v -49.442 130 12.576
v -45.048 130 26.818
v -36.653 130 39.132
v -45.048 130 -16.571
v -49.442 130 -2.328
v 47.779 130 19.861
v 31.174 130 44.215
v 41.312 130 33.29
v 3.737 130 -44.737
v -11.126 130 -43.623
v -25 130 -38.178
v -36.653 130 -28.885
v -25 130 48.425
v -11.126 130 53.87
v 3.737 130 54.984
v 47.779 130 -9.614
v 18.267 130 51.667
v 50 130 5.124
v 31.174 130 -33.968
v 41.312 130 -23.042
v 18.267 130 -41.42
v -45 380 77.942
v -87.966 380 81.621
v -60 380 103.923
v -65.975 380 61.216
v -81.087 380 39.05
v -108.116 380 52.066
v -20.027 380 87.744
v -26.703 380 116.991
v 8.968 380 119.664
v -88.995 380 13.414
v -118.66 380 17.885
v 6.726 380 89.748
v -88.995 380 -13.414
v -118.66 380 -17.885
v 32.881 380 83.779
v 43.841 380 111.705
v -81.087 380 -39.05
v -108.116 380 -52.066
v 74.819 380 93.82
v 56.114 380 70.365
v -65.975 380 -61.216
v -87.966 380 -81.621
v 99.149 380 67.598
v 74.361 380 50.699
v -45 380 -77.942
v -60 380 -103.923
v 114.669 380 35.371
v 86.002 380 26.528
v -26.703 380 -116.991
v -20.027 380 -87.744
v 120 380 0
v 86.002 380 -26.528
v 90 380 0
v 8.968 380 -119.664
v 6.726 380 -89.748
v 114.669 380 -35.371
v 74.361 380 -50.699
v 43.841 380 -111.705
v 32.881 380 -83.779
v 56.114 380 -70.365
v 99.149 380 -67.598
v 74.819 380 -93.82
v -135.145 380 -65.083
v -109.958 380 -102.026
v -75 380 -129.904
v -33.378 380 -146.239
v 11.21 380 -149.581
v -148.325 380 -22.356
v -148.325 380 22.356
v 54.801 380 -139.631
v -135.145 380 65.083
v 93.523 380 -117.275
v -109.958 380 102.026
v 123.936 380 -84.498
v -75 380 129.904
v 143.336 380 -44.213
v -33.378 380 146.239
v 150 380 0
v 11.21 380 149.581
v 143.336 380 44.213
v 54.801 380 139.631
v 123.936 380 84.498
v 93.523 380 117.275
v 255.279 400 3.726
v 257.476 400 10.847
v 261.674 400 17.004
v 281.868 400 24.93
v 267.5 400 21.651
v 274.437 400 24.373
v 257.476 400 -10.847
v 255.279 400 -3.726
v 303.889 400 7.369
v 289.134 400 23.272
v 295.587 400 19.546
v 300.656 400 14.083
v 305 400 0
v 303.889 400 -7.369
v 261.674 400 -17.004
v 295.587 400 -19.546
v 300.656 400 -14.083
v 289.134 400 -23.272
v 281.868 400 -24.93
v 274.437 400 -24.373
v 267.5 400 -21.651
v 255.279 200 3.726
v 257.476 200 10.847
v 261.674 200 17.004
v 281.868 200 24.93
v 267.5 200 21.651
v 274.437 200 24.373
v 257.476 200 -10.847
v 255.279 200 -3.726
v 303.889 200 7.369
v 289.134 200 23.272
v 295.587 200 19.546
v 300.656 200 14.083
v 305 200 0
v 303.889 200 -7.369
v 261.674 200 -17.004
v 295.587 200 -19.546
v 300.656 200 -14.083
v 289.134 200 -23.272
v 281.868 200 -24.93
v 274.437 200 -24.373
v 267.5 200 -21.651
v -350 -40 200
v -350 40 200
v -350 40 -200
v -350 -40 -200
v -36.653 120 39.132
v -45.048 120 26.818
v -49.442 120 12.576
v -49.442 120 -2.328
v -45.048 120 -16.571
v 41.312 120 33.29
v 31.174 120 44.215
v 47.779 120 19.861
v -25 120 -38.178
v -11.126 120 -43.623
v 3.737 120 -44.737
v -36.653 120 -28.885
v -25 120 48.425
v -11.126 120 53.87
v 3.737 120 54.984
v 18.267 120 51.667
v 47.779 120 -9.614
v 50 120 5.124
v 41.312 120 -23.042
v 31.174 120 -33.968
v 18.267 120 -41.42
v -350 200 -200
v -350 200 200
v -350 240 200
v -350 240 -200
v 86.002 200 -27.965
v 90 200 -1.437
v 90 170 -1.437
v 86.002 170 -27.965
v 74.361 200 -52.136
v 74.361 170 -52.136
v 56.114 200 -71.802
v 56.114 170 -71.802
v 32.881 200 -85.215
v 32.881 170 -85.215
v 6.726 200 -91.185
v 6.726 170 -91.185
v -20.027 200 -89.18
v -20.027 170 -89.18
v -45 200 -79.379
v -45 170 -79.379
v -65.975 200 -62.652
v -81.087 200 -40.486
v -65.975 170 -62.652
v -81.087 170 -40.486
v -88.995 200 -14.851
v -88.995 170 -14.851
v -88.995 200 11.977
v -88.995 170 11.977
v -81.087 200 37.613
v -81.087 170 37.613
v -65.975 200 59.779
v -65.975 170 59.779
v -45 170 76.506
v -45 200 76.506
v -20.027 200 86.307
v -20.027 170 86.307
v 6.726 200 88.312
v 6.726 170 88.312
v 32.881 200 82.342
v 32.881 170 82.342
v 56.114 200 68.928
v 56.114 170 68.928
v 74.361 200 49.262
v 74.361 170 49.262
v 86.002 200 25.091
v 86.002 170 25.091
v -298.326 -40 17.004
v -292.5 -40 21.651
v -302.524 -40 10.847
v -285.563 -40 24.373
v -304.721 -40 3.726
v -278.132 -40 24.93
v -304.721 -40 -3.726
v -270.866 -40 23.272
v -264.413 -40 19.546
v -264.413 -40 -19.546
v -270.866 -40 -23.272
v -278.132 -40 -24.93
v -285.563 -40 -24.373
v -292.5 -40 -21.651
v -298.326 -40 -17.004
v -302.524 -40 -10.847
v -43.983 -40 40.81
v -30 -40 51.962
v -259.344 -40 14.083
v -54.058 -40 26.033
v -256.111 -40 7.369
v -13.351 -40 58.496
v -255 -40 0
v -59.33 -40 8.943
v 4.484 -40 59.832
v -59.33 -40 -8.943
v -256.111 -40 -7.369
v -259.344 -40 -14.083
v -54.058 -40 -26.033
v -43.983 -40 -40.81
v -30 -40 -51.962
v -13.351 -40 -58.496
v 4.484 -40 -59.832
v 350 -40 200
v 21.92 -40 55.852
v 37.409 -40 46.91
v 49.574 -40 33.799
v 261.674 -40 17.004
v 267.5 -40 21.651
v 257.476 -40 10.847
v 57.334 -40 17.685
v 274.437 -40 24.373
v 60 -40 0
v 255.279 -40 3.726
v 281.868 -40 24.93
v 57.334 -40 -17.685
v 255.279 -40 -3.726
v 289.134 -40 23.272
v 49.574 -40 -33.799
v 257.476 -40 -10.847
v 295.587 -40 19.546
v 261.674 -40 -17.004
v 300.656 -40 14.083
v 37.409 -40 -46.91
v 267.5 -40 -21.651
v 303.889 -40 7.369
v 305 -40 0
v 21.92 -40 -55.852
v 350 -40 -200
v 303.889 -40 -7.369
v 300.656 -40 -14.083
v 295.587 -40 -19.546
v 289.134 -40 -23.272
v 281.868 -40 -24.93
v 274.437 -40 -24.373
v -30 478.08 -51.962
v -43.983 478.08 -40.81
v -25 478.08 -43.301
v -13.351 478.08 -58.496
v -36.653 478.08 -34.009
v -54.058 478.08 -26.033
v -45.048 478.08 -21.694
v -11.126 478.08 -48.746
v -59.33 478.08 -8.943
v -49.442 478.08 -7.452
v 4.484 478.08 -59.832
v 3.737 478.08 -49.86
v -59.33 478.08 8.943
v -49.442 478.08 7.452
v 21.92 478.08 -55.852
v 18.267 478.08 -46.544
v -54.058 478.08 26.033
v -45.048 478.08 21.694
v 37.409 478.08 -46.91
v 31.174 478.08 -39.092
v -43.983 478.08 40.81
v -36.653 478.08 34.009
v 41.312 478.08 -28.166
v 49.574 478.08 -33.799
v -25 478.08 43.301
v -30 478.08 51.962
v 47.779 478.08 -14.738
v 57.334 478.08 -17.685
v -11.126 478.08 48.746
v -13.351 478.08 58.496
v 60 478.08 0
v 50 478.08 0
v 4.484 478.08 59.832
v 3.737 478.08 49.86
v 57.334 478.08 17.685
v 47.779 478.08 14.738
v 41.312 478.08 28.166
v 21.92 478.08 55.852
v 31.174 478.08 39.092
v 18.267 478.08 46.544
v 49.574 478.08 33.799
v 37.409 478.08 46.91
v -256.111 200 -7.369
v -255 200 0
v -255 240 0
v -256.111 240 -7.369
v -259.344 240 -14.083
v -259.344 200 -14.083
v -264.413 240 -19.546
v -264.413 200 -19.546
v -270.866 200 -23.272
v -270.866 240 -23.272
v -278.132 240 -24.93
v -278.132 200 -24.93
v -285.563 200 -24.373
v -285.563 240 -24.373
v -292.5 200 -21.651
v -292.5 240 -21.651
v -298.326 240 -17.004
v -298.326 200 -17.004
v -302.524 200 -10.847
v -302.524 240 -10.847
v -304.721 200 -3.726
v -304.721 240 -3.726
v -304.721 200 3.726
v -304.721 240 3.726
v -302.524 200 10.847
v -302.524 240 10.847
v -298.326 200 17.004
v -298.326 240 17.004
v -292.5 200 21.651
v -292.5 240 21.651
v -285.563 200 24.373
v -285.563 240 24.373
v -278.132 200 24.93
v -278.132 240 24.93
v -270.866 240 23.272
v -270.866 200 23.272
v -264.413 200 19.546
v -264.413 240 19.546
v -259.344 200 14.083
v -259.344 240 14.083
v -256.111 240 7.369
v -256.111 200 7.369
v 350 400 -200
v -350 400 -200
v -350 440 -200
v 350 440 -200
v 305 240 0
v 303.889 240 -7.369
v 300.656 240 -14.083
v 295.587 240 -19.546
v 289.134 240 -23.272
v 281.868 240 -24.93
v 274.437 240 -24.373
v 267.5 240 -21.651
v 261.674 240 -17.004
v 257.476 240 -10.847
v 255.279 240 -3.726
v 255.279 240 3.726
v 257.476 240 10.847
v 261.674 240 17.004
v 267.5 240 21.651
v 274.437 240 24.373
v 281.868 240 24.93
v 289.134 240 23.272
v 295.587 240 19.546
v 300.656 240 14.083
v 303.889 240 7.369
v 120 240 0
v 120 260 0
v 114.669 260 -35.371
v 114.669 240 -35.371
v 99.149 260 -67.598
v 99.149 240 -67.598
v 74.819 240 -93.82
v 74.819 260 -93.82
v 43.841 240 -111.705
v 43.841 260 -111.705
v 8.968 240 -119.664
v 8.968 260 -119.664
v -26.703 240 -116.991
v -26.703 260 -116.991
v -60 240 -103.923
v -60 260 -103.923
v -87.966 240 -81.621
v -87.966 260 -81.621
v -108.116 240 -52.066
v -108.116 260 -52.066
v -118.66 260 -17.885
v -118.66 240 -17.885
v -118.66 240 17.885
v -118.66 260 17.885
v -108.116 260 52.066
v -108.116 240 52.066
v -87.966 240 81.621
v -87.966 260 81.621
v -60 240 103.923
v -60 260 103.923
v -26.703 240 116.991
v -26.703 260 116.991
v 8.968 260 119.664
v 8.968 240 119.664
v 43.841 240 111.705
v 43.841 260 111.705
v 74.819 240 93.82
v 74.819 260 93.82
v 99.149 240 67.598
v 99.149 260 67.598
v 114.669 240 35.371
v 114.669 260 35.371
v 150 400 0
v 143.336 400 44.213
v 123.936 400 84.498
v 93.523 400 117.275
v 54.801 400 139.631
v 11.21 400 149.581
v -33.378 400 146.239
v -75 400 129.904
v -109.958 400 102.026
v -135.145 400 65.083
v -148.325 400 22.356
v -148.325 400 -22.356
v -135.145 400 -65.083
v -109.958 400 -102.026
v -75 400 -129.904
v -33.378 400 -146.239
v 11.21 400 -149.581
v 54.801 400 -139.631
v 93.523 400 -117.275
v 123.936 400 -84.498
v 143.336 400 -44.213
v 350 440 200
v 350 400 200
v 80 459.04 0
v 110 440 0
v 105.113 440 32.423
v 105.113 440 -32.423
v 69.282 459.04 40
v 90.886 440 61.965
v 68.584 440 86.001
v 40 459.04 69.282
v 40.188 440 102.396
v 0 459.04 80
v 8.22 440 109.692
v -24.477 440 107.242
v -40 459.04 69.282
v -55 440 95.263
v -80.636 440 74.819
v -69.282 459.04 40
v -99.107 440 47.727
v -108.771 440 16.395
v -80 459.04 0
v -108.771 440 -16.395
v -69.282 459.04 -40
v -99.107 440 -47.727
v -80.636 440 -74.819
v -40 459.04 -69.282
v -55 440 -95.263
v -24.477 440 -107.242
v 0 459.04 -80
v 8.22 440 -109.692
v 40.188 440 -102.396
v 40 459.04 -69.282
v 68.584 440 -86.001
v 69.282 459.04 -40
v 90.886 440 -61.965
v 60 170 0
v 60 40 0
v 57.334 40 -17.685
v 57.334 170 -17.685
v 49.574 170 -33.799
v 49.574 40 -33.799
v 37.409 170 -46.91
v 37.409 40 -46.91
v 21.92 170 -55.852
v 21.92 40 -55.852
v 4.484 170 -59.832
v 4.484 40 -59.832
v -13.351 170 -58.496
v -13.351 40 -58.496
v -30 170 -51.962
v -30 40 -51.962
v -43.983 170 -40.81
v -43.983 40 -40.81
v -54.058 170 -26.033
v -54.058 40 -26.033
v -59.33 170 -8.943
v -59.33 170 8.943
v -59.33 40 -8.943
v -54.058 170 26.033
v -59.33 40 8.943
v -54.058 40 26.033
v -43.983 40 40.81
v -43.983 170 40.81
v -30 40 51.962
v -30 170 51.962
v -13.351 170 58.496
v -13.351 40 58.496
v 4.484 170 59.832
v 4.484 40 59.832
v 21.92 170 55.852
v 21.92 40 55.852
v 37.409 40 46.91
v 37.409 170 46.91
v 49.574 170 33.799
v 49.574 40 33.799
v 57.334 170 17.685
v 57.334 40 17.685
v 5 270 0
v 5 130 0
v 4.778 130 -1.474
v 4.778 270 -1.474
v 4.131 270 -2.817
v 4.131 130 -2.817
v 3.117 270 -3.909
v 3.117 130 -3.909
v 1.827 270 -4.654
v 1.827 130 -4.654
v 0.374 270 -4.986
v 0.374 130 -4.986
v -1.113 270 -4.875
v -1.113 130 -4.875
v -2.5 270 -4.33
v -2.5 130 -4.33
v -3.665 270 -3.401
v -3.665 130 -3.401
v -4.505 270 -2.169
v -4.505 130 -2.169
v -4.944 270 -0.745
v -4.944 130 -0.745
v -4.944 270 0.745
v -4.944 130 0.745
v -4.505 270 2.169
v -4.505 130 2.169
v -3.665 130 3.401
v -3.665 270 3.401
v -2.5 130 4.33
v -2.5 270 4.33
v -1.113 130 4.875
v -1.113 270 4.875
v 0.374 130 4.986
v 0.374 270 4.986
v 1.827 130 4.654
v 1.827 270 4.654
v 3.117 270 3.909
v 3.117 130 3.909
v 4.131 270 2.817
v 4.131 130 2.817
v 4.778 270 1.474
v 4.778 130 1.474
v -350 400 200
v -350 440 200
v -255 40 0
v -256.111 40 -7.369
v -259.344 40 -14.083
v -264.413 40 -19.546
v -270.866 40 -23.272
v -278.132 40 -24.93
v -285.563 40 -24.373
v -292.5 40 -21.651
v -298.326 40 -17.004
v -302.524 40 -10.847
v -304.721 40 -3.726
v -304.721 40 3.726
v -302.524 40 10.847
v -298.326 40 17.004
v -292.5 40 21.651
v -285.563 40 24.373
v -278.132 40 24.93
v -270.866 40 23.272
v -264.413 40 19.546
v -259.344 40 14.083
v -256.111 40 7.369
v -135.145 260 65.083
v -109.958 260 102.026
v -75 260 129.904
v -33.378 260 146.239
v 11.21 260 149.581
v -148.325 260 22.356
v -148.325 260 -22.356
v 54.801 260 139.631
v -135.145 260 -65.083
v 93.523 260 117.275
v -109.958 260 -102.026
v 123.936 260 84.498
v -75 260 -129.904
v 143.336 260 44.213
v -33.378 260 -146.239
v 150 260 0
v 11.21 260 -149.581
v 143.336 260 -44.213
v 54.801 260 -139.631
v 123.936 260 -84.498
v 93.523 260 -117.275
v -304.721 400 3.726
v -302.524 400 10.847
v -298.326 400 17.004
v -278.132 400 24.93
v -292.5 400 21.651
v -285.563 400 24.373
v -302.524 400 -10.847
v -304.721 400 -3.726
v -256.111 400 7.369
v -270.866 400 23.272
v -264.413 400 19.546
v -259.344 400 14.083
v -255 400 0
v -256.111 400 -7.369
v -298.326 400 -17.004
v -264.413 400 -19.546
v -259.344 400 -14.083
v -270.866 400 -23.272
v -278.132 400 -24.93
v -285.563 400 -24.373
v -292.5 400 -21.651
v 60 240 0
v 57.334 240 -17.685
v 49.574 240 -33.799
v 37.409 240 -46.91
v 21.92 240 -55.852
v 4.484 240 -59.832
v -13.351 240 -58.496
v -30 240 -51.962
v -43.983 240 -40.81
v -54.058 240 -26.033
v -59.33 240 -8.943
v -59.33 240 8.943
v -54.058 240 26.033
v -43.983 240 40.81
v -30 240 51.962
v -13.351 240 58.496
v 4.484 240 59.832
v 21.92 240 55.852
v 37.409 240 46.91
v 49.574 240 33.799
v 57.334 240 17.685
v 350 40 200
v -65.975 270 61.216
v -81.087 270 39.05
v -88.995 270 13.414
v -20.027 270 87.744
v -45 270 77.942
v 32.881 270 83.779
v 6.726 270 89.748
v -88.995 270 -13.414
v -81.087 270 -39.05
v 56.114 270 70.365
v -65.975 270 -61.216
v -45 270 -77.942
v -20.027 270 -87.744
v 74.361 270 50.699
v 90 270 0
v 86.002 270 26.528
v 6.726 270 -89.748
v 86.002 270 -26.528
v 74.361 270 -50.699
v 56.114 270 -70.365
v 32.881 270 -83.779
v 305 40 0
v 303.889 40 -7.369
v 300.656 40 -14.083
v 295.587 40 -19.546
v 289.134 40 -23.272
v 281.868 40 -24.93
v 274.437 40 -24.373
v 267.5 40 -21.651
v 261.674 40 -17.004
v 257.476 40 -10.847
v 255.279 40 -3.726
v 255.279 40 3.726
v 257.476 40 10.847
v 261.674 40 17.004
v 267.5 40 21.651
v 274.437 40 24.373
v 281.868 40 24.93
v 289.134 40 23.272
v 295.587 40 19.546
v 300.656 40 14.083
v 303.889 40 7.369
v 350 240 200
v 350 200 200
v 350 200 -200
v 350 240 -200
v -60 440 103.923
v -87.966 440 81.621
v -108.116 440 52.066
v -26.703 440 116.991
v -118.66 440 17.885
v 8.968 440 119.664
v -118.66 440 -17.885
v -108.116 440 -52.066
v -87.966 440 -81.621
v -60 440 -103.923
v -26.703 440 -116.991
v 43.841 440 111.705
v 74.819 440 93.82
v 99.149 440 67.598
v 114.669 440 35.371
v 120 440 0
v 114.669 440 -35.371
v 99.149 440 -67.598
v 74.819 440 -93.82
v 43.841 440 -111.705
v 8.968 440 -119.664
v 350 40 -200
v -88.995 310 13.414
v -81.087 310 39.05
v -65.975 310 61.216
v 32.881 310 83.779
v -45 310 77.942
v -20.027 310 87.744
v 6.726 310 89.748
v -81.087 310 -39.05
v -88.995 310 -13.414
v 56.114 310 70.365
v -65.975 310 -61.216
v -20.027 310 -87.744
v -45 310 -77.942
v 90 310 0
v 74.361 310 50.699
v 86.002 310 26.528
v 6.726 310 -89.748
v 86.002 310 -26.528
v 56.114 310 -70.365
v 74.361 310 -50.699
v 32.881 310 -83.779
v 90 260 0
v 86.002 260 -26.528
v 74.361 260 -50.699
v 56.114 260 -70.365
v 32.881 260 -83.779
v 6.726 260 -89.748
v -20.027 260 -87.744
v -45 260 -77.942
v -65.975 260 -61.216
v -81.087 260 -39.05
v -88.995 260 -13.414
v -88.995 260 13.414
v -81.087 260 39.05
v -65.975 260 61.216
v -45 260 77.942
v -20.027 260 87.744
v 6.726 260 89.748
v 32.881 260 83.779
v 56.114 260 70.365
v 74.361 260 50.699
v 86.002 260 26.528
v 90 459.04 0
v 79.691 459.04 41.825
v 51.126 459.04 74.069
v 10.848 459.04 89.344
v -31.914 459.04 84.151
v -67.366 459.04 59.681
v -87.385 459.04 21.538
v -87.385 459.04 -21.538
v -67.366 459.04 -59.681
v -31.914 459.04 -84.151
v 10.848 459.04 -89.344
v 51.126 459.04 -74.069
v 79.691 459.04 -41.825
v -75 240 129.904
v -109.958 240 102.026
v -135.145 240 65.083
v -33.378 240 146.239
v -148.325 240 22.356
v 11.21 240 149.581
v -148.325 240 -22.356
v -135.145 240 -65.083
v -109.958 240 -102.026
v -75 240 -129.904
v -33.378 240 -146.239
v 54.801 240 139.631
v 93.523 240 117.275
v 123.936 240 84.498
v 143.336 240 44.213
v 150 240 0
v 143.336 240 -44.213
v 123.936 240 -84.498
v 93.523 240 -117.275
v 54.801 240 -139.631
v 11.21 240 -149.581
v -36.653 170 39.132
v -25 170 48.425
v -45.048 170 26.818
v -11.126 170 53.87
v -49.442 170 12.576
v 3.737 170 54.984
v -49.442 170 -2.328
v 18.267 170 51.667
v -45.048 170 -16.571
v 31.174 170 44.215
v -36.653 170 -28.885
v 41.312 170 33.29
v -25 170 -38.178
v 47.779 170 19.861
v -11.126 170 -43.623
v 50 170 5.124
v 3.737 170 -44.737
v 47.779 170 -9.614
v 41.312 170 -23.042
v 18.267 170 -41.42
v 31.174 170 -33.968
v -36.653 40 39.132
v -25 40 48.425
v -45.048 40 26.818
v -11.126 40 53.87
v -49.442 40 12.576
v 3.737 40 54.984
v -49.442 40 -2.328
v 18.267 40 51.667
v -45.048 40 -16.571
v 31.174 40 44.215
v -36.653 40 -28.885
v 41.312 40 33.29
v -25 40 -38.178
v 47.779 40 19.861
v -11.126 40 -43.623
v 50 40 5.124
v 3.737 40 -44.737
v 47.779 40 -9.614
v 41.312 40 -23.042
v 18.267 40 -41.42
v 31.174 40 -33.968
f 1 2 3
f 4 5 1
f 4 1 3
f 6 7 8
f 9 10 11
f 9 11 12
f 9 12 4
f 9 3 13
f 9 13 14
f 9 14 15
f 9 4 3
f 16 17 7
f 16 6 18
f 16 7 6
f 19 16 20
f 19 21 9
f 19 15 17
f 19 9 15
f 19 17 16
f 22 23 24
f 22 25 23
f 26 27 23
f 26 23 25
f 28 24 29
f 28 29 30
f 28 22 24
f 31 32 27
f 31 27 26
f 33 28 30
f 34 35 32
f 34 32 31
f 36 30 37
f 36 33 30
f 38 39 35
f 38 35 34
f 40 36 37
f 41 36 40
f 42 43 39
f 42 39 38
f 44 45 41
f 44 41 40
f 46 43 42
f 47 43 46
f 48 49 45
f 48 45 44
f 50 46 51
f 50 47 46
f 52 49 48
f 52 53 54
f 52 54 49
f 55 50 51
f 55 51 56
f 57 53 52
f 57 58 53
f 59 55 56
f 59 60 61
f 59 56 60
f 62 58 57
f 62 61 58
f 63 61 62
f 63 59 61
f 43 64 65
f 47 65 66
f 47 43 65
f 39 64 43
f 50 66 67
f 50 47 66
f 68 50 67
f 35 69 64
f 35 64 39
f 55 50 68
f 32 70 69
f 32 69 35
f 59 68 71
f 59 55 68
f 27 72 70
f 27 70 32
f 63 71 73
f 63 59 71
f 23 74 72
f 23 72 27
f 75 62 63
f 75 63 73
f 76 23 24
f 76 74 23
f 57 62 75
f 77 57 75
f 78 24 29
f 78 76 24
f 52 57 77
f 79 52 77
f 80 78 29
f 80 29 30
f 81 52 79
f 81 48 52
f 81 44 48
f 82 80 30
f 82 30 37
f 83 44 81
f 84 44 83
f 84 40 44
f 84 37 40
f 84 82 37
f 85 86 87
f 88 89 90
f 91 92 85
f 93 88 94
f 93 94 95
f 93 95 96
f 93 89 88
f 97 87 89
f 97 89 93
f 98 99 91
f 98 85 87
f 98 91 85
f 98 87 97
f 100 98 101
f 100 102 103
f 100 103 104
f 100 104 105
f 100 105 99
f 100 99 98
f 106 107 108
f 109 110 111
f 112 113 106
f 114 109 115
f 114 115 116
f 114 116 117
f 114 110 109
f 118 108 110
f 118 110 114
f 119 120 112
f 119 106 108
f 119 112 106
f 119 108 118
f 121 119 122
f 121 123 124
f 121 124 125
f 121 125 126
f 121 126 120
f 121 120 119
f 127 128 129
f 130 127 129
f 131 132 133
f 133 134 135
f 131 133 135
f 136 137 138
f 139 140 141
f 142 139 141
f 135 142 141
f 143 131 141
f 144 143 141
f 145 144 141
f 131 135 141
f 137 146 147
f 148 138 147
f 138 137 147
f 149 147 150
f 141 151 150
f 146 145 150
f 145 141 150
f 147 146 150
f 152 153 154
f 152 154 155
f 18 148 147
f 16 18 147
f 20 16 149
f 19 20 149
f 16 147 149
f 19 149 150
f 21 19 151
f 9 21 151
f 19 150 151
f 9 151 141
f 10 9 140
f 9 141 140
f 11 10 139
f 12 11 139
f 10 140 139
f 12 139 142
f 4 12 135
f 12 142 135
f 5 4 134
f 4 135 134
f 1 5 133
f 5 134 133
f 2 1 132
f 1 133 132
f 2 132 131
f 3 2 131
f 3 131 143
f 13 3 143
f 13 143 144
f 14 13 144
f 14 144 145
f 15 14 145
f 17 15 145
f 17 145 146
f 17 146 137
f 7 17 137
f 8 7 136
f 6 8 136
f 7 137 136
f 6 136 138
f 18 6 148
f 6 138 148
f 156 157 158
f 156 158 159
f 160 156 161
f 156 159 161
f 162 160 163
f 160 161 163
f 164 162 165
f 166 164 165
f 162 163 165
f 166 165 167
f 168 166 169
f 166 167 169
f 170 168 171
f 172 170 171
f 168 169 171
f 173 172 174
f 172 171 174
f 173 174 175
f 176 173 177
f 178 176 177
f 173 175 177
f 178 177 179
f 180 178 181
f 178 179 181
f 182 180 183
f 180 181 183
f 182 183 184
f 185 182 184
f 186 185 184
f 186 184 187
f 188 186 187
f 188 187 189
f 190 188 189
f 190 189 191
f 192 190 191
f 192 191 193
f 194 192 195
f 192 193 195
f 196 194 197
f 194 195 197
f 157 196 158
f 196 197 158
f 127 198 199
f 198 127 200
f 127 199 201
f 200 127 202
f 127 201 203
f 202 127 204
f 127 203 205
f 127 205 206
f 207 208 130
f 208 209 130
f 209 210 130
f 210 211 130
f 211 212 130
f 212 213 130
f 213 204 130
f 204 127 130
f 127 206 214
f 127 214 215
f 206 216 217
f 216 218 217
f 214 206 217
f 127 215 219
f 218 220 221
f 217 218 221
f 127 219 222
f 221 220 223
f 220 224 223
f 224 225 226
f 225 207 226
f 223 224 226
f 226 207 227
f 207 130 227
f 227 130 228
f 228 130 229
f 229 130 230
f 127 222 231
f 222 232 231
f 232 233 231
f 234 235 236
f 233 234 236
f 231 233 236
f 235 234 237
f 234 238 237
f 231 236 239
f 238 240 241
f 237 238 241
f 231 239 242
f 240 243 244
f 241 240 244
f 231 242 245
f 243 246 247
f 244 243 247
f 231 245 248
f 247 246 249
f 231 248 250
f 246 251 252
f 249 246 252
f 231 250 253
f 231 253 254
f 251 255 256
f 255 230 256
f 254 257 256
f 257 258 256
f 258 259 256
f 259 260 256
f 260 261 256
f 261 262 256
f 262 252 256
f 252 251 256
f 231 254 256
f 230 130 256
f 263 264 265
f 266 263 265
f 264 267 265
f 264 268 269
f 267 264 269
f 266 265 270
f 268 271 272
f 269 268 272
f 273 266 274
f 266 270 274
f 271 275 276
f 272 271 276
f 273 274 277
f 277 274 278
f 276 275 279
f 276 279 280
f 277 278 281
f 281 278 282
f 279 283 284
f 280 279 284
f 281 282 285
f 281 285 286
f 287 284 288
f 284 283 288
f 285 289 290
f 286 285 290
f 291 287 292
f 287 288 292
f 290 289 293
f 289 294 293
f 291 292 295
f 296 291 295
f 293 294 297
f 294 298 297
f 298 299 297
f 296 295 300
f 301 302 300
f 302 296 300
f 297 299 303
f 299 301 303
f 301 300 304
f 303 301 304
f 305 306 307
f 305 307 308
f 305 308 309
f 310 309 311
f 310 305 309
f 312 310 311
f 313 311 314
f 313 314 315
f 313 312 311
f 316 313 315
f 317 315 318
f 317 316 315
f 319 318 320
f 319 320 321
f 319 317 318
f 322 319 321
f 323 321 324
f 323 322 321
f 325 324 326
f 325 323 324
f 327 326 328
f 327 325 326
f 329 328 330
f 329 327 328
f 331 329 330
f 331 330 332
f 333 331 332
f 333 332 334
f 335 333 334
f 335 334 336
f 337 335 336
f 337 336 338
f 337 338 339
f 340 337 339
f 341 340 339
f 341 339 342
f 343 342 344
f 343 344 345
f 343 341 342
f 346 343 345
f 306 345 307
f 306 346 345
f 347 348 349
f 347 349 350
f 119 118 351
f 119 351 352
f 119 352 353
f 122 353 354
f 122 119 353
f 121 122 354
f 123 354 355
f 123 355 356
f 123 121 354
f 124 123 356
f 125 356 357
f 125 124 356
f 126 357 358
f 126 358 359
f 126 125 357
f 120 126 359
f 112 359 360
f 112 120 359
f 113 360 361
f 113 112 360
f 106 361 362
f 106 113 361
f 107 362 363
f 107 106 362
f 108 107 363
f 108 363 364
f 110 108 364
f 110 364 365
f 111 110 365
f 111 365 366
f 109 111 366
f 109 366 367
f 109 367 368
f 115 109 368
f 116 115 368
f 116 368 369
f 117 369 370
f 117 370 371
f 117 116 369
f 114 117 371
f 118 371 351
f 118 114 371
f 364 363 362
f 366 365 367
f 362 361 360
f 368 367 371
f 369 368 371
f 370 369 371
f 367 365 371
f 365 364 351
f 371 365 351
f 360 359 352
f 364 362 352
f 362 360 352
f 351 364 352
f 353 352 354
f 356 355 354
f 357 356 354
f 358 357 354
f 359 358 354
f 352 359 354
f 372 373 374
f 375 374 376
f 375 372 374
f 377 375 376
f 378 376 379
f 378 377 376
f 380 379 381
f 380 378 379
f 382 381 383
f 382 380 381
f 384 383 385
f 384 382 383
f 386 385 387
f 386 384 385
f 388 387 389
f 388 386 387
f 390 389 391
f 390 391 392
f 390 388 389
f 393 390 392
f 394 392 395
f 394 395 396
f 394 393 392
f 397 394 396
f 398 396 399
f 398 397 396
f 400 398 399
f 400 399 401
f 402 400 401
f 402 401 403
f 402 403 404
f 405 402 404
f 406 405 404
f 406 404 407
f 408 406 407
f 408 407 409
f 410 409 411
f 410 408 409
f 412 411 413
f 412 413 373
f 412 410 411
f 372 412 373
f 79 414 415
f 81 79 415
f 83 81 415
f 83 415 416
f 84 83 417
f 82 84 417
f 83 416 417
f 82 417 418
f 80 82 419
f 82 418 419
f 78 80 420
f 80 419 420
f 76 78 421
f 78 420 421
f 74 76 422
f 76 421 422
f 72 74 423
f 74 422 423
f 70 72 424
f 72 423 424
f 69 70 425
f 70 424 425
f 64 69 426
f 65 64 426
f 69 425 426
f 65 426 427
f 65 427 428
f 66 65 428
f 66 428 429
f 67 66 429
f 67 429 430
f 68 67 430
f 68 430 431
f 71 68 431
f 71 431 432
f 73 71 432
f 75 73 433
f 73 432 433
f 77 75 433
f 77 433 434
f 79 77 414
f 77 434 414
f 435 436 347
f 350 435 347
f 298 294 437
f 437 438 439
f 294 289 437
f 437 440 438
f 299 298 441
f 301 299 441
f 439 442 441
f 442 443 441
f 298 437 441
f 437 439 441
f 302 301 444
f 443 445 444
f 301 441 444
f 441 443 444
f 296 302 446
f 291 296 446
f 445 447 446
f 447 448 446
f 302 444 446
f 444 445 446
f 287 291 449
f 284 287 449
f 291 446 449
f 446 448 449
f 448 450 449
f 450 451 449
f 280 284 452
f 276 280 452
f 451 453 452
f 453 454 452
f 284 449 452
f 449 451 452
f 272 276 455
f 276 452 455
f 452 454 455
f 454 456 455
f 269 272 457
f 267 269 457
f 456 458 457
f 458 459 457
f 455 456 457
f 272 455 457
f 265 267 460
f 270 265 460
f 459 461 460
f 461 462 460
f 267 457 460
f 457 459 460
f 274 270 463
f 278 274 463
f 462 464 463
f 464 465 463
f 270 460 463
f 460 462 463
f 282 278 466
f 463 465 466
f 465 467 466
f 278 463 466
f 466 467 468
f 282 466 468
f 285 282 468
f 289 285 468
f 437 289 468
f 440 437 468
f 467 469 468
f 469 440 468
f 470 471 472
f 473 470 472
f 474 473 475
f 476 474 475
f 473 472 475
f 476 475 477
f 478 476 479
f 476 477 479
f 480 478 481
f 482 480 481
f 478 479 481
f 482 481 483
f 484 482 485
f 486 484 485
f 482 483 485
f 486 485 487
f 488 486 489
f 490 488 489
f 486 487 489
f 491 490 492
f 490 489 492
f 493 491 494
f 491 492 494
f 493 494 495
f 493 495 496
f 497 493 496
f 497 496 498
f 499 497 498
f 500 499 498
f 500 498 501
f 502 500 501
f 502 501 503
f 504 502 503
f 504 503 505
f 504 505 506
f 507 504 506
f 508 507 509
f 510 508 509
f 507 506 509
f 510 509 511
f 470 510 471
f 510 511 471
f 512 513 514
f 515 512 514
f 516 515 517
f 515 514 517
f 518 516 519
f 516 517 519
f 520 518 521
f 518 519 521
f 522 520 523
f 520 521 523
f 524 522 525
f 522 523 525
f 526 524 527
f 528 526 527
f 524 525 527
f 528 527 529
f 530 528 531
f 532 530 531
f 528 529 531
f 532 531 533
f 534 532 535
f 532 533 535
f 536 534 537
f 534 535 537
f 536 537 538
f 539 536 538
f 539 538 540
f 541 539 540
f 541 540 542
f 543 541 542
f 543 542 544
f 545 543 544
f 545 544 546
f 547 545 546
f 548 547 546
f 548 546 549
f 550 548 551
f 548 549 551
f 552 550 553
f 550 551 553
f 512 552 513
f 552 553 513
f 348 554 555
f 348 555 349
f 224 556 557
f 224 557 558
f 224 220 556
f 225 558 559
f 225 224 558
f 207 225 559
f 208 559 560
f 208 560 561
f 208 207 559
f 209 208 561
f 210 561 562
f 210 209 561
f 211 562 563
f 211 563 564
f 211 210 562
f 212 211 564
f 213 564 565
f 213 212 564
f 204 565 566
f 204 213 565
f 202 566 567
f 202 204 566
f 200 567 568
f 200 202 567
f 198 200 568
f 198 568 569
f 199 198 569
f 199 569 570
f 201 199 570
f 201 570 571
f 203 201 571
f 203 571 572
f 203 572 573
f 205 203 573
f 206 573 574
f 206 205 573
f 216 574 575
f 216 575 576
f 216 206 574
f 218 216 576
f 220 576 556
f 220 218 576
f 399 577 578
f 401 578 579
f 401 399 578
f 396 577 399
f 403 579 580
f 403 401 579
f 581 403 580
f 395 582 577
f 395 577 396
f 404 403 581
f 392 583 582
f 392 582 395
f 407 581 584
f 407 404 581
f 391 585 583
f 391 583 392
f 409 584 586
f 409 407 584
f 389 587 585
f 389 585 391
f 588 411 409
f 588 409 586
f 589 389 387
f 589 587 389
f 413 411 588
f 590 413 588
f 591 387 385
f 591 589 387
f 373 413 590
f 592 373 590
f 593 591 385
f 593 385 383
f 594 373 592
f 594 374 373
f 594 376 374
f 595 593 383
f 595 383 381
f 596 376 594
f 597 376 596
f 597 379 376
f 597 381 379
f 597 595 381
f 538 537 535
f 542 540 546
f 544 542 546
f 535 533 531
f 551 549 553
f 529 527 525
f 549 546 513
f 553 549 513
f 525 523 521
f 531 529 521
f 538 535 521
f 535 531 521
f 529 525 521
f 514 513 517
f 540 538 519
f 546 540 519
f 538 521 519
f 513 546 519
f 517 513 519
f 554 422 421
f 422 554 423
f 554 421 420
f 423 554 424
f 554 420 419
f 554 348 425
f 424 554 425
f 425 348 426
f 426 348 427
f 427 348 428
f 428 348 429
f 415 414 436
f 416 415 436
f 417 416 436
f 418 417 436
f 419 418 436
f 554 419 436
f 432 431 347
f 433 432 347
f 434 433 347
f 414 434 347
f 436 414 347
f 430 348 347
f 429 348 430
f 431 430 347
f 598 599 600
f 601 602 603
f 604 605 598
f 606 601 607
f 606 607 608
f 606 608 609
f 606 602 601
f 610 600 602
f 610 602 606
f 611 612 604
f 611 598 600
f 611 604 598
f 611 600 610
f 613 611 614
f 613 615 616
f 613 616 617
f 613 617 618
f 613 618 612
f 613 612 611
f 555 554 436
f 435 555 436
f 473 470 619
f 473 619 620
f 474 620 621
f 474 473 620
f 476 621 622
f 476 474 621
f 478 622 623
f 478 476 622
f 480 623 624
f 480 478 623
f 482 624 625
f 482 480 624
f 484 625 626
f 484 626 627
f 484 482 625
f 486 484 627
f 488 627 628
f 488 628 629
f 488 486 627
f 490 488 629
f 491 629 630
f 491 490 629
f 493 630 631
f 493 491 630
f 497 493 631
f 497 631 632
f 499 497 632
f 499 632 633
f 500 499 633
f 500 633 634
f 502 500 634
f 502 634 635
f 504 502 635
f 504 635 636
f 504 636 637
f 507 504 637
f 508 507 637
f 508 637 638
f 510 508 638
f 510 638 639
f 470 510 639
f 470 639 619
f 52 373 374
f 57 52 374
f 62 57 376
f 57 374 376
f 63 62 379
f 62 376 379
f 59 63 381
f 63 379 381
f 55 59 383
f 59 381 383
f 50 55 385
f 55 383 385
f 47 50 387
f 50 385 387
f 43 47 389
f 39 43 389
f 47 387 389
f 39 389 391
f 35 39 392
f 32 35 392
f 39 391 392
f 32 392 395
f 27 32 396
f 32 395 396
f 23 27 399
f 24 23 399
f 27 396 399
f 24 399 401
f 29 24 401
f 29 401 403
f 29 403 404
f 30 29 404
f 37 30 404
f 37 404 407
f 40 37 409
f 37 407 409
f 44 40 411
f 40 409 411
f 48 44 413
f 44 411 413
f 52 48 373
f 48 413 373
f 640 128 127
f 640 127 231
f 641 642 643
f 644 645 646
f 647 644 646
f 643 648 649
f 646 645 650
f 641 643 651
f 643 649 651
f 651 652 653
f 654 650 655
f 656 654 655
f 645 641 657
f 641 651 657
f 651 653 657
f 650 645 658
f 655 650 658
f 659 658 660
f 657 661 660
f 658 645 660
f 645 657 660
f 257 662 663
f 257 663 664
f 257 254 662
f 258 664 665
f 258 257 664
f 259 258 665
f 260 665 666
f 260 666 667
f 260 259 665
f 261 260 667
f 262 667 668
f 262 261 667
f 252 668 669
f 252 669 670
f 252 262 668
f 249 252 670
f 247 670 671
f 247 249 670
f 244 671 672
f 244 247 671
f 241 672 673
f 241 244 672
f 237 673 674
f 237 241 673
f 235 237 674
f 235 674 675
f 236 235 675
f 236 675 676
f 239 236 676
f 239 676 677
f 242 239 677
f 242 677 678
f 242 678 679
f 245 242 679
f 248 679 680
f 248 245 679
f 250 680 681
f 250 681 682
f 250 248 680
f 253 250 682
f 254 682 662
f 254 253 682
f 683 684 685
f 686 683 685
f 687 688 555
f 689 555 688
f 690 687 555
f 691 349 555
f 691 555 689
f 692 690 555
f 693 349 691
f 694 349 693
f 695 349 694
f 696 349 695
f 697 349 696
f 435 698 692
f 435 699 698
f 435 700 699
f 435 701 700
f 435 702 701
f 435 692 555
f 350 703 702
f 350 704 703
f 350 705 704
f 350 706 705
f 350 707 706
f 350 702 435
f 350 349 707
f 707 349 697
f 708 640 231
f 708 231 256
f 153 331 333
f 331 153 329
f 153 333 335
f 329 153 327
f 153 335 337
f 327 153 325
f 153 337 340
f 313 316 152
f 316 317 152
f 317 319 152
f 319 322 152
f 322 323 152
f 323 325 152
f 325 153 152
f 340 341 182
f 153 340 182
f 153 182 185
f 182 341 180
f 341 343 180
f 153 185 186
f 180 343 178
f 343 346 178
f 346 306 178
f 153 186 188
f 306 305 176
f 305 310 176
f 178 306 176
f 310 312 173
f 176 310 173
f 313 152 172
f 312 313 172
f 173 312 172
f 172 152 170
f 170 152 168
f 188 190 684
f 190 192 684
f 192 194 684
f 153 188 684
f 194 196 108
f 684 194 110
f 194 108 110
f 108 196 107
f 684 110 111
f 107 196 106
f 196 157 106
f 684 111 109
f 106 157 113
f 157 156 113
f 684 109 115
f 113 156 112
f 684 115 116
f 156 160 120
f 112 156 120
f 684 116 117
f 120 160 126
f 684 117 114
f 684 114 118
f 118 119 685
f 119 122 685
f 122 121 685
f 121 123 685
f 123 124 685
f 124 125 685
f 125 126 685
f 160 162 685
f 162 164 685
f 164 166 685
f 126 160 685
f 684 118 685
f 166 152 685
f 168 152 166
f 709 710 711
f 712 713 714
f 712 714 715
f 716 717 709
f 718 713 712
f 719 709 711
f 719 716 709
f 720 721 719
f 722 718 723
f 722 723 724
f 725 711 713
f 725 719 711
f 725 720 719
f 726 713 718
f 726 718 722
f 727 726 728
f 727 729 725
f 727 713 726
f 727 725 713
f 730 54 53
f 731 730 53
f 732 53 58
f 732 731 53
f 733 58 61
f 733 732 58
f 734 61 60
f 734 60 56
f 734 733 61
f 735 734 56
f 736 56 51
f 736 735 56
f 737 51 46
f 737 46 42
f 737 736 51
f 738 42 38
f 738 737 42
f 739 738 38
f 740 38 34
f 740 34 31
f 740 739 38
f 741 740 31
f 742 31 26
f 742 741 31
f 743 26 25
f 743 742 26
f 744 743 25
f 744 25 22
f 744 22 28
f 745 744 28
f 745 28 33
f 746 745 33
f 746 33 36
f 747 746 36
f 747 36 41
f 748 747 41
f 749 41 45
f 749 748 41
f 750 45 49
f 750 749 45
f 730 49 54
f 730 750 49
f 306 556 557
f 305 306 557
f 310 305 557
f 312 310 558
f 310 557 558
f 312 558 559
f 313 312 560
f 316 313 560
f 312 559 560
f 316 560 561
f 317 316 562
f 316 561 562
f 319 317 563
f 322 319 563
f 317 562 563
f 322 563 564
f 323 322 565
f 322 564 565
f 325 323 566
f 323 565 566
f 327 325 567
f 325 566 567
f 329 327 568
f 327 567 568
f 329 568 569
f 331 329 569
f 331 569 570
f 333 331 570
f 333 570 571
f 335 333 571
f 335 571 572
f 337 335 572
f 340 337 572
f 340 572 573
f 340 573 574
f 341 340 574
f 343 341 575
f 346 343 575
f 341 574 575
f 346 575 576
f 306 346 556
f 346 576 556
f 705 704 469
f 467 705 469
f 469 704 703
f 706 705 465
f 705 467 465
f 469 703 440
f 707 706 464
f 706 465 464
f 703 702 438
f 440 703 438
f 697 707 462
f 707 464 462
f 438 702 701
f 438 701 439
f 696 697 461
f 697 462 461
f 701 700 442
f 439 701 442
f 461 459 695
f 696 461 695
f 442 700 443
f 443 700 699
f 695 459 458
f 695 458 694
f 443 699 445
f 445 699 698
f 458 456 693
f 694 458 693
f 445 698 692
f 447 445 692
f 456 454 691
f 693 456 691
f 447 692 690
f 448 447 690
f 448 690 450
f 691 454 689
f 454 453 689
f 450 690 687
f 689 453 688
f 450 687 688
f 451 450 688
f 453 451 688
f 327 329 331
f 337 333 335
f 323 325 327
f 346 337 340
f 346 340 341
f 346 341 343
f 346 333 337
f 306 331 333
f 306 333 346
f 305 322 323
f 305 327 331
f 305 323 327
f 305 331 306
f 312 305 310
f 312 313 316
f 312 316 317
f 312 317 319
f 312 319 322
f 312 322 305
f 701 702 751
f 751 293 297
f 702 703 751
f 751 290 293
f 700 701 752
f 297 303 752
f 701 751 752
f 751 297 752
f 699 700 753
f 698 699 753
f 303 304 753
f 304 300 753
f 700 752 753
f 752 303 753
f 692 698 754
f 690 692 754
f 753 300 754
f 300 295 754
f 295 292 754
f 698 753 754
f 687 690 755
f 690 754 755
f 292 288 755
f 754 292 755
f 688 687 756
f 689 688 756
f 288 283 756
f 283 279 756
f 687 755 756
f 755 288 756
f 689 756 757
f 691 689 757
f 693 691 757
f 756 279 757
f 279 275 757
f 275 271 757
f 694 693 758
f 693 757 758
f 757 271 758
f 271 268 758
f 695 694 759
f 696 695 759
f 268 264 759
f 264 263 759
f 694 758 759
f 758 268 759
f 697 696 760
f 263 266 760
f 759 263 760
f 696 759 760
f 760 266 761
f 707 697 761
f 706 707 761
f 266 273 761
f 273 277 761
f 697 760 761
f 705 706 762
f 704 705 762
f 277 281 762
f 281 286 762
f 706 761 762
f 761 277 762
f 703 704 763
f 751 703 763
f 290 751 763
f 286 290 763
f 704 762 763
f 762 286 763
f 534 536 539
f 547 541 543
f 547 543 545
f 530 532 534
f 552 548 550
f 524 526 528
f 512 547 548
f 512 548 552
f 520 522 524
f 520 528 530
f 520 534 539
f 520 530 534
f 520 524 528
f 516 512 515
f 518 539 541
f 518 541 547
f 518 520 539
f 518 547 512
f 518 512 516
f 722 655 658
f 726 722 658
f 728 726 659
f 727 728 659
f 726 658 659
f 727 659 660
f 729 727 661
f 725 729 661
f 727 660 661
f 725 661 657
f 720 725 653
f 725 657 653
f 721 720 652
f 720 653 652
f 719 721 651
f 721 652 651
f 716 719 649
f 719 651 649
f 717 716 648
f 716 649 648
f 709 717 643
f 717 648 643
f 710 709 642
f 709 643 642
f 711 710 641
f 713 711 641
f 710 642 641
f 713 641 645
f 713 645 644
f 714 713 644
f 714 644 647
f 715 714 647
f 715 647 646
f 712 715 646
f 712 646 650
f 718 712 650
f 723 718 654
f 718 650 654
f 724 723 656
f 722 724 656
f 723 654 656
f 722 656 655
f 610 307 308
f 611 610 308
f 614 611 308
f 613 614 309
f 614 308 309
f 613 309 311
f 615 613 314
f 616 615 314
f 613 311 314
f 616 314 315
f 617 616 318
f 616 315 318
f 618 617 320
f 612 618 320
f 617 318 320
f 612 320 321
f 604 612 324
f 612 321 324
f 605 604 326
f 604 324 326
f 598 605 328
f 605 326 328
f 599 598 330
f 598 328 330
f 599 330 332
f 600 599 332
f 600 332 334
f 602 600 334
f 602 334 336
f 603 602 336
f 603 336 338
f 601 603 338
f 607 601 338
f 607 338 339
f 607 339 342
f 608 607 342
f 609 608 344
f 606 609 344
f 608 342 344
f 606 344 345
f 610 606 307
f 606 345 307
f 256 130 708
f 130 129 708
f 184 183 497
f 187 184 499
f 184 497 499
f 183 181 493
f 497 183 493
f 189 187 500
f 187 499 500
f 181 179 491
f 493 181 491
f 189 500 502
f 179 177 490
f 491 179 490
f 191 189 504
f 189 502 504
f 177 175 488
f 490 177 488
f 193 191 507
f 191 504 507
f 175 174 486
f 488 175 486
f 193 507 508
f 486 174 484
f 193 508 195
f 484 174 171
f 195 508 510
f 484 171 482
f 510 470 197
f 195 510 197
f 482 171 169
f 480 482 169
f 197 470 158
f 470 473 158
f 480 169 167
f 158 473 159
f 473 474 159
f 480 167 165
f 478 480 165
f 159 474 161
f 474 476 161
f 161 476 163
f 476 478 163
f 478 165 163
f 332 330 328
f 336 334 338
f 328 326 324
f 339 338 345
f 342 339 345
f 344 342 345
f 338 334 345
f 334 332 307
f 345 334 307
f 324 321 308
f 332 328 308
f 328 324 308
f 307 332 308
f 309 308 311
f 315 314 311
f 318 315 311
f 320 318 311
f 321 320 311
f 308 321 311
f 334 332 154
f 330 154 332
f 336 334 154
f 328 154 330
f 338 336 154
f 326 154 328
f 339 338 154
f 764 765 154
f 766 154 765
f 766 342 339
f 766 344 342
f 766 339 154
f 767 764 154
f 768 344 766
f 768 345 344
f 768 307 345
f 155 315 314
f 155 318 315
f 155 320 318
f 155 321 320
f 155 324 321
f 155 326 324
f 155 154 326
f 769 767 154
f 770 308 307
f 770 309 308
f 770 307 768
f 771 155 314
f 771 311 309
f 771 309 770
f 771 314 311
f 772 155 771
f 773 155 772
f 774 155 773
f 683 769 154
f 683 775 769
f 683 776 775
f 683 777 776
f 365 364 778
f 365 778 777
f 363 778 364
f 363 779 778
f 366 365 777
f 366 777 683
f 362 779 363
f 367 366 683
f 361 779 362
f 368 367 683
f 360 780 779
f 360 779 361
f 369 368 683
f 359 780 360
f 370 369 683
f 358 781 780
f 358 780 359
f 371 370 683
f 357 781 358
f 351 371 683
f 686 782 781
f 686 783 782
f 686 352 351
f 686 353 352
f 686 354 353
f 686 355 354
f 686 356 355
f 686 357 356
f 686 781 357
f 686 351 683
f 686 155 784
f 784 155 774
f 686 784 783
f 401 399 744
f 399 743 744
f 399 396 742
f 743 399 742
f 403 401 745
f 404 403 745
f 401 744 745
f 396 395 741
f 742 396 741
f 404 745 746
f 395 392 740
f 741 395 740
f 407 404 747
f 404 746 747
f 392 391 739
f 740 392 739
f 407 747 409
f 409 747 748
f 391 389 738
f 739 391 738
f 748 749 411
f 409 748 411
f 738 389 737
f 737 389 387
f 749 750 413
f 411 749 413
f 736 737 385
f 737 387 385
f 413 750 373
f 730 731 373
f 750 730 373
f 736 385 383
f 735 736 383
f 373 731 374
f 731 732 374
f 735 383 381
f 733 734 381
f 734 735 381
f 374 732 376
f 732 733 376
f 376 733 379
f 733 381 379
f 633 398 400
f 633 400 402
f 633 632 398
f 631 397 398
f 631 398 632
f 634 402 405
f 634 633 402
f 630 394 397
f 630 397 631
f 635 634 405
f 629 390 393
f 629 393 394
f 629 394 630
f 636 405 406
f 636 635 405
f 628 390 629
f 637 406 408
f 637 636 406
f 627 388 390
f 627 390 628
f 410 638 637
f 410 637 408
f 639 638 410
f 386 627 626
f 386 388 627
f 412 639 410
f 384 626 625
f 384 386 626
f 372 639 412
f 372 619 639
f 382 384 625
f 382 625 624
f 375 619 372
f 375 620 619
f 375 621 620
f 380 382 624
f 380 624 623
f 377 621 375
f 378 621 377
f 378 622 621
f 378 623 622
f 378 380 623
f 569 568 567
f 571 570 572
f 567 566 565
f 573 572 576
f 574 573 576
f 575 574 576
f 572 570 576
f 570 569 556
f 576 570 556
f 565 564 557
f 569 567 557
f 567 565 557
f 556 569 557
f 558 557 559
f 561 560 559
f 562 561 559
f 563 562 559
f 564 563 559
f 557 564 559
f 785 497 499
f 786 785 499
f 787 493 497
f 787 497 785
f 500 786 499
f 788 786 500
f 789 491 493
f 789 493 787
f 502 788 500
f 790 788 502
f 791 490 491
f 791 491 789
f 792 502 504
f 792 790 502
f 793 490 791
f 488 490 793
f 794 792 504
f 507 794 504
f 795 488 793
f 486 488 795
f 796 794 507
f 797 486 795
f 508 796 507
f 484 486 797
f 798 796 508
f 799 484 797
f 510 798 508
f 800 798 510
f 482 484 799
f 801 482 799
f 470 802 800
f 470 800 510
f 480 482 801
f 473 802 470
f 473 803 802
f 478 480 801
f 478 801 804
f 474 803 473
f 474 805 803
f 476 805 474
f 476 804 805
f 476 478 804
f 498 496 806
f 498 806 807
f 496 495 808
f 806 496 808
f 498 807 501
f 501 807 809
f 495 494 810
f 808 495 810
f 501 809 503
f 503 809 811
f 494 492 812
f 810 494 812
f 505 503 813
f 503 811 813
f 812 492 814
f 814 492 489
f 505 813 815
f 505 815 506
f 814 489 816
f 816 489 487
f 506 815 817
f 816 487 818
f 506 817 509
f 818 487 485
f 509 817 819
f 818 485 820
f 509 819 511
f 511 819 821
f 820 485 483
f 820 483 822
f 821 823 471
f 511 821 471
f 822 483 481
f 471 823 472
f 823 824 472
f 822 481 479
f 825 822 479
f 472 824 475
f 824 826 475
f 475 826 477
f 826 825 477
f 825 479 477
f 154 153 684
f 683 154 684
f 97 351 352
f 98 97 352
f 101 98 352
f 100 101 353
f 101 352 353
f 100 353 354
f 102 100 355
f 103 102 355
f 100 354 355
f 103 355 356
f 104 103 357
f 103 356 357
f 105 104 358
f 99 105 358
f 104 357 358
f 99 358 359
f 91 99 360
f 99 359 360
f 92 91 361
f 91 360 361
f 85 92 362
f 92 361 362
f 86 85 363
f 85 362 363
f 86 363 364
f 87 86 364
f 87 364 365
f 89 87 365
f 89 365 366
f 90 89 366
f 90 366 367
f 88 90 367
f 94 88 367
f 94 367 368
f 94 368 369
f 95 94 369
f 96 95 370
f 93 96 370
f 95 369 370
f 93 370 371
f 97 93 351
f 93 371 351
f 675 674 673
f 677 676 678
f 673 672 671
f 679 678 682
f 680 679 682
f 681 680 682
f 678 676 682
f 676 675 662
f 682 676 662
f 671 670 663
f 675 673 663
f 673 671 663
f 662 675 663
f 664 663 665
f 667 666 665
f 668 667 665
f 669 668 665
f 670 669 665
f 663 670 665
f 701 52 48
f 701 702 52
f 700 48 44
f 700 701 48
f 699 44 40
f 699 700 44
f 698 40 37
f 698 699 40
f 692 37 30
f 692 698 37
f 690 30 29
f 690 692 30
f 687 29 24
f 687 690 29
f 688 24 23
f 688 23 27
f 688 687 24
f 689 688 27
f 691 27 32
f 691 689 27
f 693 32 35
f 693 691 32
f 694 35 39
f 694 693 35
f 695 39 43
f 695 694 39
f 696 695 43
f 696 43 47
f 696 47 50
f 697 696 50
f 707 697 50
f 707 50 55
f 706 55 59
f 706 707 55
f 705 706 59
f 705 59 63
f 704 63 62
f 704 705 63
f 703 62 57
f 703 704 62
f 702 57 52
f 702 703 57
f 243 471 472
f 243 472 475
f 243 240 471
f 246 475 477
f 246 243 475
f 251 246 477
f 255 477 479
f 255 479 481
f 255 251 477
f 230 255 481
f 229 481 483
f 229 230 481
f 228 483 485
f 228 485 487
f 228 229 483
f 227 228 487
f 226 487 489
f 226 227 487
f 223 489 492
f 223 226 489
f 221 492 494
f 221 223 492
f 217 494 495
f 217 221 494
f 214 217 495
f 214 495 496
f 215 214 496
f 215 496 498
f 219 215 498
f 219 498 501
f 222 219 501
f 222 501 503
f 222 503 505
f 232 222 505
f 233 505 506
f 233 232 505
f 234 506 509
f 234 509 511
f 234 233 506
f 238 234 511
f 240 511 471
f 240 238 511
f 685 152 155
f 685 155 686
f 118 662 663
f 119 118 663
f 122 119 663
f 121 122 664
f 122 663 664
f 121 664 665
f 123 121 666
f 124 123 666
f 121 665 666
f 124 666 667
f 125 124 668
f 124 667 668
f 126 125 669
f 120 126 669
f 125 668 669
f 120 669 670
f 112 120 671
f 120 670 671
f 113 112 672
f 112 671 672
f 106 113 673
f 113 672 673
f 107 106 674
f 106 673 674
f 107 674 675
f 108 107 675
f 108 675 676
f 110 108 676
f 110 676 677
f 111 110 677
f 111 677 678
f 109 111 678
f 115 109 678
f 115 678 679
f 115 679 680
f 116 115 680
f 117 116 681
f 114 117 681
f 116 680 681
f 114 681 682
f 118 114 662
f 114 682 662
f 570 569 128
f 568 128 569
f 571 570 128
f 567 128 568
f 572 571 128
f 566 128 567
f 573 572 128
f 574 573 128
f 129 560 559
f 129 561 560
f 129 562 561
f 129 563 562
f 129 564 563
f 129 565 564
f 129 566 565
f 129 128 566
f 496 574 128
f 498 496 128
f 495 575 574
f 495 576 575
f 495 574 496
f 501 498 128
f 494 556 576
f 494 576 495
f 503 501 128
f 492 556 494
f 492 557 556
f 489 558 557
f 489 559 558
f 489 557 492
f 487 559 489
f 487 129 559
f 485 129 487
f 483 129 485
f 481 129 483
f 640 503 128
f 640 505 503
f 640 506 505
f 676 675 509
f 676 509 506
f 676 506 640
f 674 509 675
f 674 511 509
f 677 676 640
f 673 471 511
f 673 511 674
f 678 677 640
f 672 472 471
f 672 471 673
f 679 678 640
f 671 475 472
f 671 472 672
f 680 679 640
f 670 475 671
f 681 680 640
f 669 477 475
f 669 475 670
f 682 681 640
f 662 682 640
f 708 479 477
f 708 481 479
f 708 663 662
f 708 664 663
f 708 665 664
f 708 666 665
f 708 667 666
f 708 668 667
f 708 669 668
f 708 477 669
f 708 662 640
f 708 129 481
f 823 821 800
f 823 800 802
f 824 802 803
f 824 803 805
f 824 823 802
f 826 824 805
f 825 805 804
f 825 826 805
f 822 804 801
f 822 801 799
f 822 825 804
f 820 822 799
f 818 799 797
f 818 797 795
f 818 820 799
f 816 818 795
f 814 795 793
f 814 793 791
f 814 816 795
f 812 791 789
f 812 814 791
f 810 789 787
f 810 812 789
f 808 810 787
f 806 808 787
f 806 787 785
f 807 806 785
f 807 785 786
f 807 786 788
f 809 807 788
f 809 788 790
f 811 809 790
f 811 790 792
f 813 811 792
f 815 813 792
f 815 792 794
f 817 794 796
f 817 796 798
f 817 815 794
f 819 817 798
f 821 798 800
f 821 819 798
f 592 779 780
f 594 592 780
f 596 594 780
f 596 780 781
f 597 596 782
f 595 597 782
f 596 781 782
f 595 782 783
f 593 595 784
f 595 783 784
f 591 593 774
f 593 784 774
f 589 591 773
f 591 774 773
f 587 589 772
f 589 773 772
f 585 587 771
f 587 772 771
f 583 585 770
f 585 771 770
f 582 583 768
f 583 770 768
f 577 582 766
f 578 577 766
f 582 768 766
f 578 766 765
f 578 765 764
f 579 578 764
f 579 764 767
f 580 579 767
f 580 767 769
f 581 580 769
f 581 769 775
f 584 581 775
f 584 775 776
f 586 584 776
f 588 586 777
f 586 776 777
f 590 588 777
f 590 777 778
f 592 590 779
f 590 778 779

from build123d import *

# Parameters (mm, degrees)
SKETCH1_W              = 700
SKETCH1_H              = 400
SKETCH1_R              = 25
SKETCH1_R_2            = 60
BOSS_EXTRUDE1_DEPTH    = 40
SKETCH4_W              = 700
SKETCH4_H              = 400
SKETCH4_R              = 120
BOSS_EXTRUDE3_DEPTH    = 40
SKETCH5_W              = 700
SKETCH5_H              = 400
SKETCH5_R              = 25
SKETCH5_R_2            = 60
BOSS_EXTRUDE5_DEPTH    = 40
SKETCH6_R              = 60
SKETCH6_R_2            = 50
BOSS_EXTRUDE6_DEPTH    = 130
SKETCH7_R              = 25
BOSS_EXTRUDE7_DEPTH    = 160
BOSS_EXTRUDE7_2_DEPTH  = 160
SKETCH8_R              = 50
BOSS_EXTRUDE8_DEPTH    = 10
SKETCH9_R              = 5
BOSS_EXTRUDE9_DEPTH    = 140
SKETCH10_R             = 90
SKETCH10_R_2           = 60
BOSS_EXTRUDE10_DEPTH   = 30
SKETCH11_R             = 90
BOSS_EXTRUDE11_DEPTH   = 40
SKETCH12_R             = 150
SKETCH12_R_2           = 120
BOSS_EXTRUDE13_DEPTH   = 20
SKETCH13_R             = 120
SKETCH13_R_2           = 90
BOSS_EXTRUDE15_DEPTH   = 120
SKETCH17_R             = 150
SKETCH17_R_2           = 120
BOSS_EXTRUDE17_DEPTH   = 20
SKETCH18_R             = 25
BOSS_EXTRUDE18_DEPTH   = 160
BOSS_EXTRUDE18_2_DEPTH = 160


with BuildPart() as part:
    # Sketch1 → Boss-Extrude1 (new body, symmetric)
    with BuildSketch(Plane(origin=(0, 0, 0), x_dir=(1, 0, 0), z_dir=(0, 1, 0))):
        Rectangle(SKETCH1_W, SKETCH1_H)
        with Locations((-280, 0)):
            Circle(SKETCH1_R, mode=Mode.SUBTRACT)
        with Locations((280, 0)):
            Circle(SKETCH1_R, mode=Mode.SUBTRACT)
        Circle(SKETCH1_R_2, mode=Mode.SUBTRACT)
    extrude(amount=BOSS_EXTRUDE1_DEPTH, both=True)


with BuildPart() as body_2:
    # Sketch4 → Boss-Extrude3 (new body)
    with BuildSketch(Plane(origin=(0, 400, 0), x_dir=(1, 0, 0), z_dir=(0, 1, 0))):
        Rectangle(SKETCH4_W, SKETCH4_H)
        Circle(SKETCH4_R, mode=Mode.SUBTRACT)
    extrude(amount=BOSS_EXTRUDE3_DEPTH)

    # Sketch17 → Boss-Extrude17 (add)
    with BuildSketch(Plane.XZ.offset(-400)):
        Circle(SKETCH17_R)
        Circle(SKETCH17_R_2, mode=Mode.SUBTRACT)
    extrude(amount=BOSS_EXTRUDE17_DEPTH)


with BuildPart() as body_3:
    # Sketch5 → Boss-Extrude5 (new body)
    with BuildSketch(Plane(origin=(0, 200, 0), x_dir=(1, 0, 0), z_dir=(0, 1, 0))):
        Rectangle(SKETCH5_W, SKETCH5_H)
        with Locations((-280, 0)):
            Circle(SKETCH5_R, mode=Mode.SUBTRACT)
        with Locations((280, 0)):
            Circle(SKETCH5_R, mode=Mode.SUBTRACT)
        Circle(SKETCH5_R_2, mode=Mode.SUBTRACT)
    extrude(amount=BOSS_EXTRUDE5_DEPTH)

    # Sketch10 → Boss-Extrude10 (add)
    with BuildSketch(Plane(origin=(0, 170, 0), x_dir=(1, 0, 0), z_dir=(0, 1, 0))):
        with Locations((0, 1.436744995)):
            Circle(SKETCH10_R)
        Circle(SKETCH10_R_2, mode=Mode.SUBTRACT)
    extrude(amount=BOSS_EXTRUDE10_DEPTH)

    # Sketch12 → Boss-Extrude13 (add)
    with BuildSketch(Plane(origin=(0, 240, 0), x_dir=(1, 0, 0), z_dir=(0, 1, 0))):
        Circle(SKETCH12_R)
        Circle(SKETCH12_R_2, mode=Mode.SUBTRACT)
    extrude(amount=BOSS_EXTRUDE13_DEPTH)


with BuildPart() as body_4:
    # Sketch6 → Boss-Extrude6 (new body)
    with BuildSketch(Plane(origin=(0, 40, 0), x_dir=(1, 0, 0), z_dir=(0, 1, 0))):
        Circle(SKETCH6_R)
        with Locations((0, -5.12368521)):
            Circle(SKETCH6_R_2, mode=Mode.SUBTRACT)
    extrude(amount=BOSS_EXTRUDE6_DEPTH)


with BuildPart() as body_5:
    # Sketch7 → Boss-Extrude7 (new body)
    with BuildSketch(Plane(origin=(0, 40, 0), x_dir=(1, 0, 0), z_dir=(0, 1, 0))):
        with Locations((-280, 0)):
            Circle(SKETCH7_R)
    extrude(amount=BOSS_EXTRUDE7_DEPTH)


with BuildPart() as body_6:
    # Sketch7 → Boss-Extrude7 2 (new body)
    with BuildSketch(Plane(origin=(0, 40, 0), x_dir=(1, 0, 0), z_dir=(0, 1, 0))):
        with Locations((280, 0)):
            Circle(SKETCH7_R)
    extrude(amount=BOSS_EXTRUDE7_2_DEPTH)


with BuildPart() as body_7:
    # Sketch8 → Boss-Extrude8 (new body)
    with BuildSketch(Plane(origin=(0, 120, 0), x_dir=(1, 0, 0), z_dir=(0, 1, 0))):
        with Locations((0, -5.12368521)):
            Circle(SKETCH8_R)
    extrude(amount=BOSS_EXTRUDE8_DEPTH)


with BuildPart() as body_8:
    # Sketch9 → Boss-Extrude9 (new body)
    with BuildSketch(Plane(origin=(0, 130, 0), x_dir=(1, 0, 0), z_dir=(0, 1, 0))):
        Circle(SKETCH9_R)
    extrude(amount=BOSS_EXTRUDE9_DEPTH)


with BuildPart() as body_9:
    # Sketch11 → Boss-Extrude11 (new body)
    with BuildSketch(Plane(origin=(0, 270, 0), x_dir=(1, 0, 0), z_dir=(0, 1, 0))):
        Circle(SKETCH11_R)
    extrude(amount=BOSS_EXTRUDE11_DEPTH)


with BuildPart() as body_10:
    # Sketch13 → Boss-Extrude15 (new body)
    with BuildSketch(Plane(origin=(0, 260, 0), x_dir=(1, 0, 0), z_dir=(0, 1, 0))):
        Circle(SKETCH13_R)
        Circle(SKETCH13_R_2, mode=Mode.SUBTRACT)
    extrude(amount=BOSS_EXTRUDE15_DEPTH)


with BuildPart() as body_11:
    # Sketch18 → Boss-Extrude18 (new body)
    with BuildSketch(Plane(origin=(0, 240, 0), x_dir=(1, 0, 0), z_dir=(0, 1, 0))):
        with Locations((-280, 0)):
            Circle(SKETCH18_R)
    extrude(amount=BOSS_EXTRUDE18_DEPTH)


with BuildPart() as body_12:
    # Sketch18 → Boss-Extrude18 2 (new body)
    with BuildSketch(Plane(origin=(0, 240, 0), x_dir=(1, 0, 0), z_dir=(0, 1, 0))):
        with Locations((280, 0)):
            Circle(SKETCH18_R)
    extrude(amount=BOSS_EXTRUDE18_2_DEPTH)


with BuildPart() as body_13:
    # Sketch32 → Revolve1 (revolve)
    with BuildSketch(Plane.XY):
        Polygon((120, 440), (60, 478.079788953), (50, 478.079788953), (110, 440), align=None)
    revolve(axis=Axis((0, 562.46392895, 0), (0, -1, 0)))


solid = Compound([part.part, body_2.part, body_3.part, body_4.part, body_5.part, body_6.part, body_7.part, body_8.part, body_9.part, body_10.part, body_11.part, body_12.part, body_13.part])
